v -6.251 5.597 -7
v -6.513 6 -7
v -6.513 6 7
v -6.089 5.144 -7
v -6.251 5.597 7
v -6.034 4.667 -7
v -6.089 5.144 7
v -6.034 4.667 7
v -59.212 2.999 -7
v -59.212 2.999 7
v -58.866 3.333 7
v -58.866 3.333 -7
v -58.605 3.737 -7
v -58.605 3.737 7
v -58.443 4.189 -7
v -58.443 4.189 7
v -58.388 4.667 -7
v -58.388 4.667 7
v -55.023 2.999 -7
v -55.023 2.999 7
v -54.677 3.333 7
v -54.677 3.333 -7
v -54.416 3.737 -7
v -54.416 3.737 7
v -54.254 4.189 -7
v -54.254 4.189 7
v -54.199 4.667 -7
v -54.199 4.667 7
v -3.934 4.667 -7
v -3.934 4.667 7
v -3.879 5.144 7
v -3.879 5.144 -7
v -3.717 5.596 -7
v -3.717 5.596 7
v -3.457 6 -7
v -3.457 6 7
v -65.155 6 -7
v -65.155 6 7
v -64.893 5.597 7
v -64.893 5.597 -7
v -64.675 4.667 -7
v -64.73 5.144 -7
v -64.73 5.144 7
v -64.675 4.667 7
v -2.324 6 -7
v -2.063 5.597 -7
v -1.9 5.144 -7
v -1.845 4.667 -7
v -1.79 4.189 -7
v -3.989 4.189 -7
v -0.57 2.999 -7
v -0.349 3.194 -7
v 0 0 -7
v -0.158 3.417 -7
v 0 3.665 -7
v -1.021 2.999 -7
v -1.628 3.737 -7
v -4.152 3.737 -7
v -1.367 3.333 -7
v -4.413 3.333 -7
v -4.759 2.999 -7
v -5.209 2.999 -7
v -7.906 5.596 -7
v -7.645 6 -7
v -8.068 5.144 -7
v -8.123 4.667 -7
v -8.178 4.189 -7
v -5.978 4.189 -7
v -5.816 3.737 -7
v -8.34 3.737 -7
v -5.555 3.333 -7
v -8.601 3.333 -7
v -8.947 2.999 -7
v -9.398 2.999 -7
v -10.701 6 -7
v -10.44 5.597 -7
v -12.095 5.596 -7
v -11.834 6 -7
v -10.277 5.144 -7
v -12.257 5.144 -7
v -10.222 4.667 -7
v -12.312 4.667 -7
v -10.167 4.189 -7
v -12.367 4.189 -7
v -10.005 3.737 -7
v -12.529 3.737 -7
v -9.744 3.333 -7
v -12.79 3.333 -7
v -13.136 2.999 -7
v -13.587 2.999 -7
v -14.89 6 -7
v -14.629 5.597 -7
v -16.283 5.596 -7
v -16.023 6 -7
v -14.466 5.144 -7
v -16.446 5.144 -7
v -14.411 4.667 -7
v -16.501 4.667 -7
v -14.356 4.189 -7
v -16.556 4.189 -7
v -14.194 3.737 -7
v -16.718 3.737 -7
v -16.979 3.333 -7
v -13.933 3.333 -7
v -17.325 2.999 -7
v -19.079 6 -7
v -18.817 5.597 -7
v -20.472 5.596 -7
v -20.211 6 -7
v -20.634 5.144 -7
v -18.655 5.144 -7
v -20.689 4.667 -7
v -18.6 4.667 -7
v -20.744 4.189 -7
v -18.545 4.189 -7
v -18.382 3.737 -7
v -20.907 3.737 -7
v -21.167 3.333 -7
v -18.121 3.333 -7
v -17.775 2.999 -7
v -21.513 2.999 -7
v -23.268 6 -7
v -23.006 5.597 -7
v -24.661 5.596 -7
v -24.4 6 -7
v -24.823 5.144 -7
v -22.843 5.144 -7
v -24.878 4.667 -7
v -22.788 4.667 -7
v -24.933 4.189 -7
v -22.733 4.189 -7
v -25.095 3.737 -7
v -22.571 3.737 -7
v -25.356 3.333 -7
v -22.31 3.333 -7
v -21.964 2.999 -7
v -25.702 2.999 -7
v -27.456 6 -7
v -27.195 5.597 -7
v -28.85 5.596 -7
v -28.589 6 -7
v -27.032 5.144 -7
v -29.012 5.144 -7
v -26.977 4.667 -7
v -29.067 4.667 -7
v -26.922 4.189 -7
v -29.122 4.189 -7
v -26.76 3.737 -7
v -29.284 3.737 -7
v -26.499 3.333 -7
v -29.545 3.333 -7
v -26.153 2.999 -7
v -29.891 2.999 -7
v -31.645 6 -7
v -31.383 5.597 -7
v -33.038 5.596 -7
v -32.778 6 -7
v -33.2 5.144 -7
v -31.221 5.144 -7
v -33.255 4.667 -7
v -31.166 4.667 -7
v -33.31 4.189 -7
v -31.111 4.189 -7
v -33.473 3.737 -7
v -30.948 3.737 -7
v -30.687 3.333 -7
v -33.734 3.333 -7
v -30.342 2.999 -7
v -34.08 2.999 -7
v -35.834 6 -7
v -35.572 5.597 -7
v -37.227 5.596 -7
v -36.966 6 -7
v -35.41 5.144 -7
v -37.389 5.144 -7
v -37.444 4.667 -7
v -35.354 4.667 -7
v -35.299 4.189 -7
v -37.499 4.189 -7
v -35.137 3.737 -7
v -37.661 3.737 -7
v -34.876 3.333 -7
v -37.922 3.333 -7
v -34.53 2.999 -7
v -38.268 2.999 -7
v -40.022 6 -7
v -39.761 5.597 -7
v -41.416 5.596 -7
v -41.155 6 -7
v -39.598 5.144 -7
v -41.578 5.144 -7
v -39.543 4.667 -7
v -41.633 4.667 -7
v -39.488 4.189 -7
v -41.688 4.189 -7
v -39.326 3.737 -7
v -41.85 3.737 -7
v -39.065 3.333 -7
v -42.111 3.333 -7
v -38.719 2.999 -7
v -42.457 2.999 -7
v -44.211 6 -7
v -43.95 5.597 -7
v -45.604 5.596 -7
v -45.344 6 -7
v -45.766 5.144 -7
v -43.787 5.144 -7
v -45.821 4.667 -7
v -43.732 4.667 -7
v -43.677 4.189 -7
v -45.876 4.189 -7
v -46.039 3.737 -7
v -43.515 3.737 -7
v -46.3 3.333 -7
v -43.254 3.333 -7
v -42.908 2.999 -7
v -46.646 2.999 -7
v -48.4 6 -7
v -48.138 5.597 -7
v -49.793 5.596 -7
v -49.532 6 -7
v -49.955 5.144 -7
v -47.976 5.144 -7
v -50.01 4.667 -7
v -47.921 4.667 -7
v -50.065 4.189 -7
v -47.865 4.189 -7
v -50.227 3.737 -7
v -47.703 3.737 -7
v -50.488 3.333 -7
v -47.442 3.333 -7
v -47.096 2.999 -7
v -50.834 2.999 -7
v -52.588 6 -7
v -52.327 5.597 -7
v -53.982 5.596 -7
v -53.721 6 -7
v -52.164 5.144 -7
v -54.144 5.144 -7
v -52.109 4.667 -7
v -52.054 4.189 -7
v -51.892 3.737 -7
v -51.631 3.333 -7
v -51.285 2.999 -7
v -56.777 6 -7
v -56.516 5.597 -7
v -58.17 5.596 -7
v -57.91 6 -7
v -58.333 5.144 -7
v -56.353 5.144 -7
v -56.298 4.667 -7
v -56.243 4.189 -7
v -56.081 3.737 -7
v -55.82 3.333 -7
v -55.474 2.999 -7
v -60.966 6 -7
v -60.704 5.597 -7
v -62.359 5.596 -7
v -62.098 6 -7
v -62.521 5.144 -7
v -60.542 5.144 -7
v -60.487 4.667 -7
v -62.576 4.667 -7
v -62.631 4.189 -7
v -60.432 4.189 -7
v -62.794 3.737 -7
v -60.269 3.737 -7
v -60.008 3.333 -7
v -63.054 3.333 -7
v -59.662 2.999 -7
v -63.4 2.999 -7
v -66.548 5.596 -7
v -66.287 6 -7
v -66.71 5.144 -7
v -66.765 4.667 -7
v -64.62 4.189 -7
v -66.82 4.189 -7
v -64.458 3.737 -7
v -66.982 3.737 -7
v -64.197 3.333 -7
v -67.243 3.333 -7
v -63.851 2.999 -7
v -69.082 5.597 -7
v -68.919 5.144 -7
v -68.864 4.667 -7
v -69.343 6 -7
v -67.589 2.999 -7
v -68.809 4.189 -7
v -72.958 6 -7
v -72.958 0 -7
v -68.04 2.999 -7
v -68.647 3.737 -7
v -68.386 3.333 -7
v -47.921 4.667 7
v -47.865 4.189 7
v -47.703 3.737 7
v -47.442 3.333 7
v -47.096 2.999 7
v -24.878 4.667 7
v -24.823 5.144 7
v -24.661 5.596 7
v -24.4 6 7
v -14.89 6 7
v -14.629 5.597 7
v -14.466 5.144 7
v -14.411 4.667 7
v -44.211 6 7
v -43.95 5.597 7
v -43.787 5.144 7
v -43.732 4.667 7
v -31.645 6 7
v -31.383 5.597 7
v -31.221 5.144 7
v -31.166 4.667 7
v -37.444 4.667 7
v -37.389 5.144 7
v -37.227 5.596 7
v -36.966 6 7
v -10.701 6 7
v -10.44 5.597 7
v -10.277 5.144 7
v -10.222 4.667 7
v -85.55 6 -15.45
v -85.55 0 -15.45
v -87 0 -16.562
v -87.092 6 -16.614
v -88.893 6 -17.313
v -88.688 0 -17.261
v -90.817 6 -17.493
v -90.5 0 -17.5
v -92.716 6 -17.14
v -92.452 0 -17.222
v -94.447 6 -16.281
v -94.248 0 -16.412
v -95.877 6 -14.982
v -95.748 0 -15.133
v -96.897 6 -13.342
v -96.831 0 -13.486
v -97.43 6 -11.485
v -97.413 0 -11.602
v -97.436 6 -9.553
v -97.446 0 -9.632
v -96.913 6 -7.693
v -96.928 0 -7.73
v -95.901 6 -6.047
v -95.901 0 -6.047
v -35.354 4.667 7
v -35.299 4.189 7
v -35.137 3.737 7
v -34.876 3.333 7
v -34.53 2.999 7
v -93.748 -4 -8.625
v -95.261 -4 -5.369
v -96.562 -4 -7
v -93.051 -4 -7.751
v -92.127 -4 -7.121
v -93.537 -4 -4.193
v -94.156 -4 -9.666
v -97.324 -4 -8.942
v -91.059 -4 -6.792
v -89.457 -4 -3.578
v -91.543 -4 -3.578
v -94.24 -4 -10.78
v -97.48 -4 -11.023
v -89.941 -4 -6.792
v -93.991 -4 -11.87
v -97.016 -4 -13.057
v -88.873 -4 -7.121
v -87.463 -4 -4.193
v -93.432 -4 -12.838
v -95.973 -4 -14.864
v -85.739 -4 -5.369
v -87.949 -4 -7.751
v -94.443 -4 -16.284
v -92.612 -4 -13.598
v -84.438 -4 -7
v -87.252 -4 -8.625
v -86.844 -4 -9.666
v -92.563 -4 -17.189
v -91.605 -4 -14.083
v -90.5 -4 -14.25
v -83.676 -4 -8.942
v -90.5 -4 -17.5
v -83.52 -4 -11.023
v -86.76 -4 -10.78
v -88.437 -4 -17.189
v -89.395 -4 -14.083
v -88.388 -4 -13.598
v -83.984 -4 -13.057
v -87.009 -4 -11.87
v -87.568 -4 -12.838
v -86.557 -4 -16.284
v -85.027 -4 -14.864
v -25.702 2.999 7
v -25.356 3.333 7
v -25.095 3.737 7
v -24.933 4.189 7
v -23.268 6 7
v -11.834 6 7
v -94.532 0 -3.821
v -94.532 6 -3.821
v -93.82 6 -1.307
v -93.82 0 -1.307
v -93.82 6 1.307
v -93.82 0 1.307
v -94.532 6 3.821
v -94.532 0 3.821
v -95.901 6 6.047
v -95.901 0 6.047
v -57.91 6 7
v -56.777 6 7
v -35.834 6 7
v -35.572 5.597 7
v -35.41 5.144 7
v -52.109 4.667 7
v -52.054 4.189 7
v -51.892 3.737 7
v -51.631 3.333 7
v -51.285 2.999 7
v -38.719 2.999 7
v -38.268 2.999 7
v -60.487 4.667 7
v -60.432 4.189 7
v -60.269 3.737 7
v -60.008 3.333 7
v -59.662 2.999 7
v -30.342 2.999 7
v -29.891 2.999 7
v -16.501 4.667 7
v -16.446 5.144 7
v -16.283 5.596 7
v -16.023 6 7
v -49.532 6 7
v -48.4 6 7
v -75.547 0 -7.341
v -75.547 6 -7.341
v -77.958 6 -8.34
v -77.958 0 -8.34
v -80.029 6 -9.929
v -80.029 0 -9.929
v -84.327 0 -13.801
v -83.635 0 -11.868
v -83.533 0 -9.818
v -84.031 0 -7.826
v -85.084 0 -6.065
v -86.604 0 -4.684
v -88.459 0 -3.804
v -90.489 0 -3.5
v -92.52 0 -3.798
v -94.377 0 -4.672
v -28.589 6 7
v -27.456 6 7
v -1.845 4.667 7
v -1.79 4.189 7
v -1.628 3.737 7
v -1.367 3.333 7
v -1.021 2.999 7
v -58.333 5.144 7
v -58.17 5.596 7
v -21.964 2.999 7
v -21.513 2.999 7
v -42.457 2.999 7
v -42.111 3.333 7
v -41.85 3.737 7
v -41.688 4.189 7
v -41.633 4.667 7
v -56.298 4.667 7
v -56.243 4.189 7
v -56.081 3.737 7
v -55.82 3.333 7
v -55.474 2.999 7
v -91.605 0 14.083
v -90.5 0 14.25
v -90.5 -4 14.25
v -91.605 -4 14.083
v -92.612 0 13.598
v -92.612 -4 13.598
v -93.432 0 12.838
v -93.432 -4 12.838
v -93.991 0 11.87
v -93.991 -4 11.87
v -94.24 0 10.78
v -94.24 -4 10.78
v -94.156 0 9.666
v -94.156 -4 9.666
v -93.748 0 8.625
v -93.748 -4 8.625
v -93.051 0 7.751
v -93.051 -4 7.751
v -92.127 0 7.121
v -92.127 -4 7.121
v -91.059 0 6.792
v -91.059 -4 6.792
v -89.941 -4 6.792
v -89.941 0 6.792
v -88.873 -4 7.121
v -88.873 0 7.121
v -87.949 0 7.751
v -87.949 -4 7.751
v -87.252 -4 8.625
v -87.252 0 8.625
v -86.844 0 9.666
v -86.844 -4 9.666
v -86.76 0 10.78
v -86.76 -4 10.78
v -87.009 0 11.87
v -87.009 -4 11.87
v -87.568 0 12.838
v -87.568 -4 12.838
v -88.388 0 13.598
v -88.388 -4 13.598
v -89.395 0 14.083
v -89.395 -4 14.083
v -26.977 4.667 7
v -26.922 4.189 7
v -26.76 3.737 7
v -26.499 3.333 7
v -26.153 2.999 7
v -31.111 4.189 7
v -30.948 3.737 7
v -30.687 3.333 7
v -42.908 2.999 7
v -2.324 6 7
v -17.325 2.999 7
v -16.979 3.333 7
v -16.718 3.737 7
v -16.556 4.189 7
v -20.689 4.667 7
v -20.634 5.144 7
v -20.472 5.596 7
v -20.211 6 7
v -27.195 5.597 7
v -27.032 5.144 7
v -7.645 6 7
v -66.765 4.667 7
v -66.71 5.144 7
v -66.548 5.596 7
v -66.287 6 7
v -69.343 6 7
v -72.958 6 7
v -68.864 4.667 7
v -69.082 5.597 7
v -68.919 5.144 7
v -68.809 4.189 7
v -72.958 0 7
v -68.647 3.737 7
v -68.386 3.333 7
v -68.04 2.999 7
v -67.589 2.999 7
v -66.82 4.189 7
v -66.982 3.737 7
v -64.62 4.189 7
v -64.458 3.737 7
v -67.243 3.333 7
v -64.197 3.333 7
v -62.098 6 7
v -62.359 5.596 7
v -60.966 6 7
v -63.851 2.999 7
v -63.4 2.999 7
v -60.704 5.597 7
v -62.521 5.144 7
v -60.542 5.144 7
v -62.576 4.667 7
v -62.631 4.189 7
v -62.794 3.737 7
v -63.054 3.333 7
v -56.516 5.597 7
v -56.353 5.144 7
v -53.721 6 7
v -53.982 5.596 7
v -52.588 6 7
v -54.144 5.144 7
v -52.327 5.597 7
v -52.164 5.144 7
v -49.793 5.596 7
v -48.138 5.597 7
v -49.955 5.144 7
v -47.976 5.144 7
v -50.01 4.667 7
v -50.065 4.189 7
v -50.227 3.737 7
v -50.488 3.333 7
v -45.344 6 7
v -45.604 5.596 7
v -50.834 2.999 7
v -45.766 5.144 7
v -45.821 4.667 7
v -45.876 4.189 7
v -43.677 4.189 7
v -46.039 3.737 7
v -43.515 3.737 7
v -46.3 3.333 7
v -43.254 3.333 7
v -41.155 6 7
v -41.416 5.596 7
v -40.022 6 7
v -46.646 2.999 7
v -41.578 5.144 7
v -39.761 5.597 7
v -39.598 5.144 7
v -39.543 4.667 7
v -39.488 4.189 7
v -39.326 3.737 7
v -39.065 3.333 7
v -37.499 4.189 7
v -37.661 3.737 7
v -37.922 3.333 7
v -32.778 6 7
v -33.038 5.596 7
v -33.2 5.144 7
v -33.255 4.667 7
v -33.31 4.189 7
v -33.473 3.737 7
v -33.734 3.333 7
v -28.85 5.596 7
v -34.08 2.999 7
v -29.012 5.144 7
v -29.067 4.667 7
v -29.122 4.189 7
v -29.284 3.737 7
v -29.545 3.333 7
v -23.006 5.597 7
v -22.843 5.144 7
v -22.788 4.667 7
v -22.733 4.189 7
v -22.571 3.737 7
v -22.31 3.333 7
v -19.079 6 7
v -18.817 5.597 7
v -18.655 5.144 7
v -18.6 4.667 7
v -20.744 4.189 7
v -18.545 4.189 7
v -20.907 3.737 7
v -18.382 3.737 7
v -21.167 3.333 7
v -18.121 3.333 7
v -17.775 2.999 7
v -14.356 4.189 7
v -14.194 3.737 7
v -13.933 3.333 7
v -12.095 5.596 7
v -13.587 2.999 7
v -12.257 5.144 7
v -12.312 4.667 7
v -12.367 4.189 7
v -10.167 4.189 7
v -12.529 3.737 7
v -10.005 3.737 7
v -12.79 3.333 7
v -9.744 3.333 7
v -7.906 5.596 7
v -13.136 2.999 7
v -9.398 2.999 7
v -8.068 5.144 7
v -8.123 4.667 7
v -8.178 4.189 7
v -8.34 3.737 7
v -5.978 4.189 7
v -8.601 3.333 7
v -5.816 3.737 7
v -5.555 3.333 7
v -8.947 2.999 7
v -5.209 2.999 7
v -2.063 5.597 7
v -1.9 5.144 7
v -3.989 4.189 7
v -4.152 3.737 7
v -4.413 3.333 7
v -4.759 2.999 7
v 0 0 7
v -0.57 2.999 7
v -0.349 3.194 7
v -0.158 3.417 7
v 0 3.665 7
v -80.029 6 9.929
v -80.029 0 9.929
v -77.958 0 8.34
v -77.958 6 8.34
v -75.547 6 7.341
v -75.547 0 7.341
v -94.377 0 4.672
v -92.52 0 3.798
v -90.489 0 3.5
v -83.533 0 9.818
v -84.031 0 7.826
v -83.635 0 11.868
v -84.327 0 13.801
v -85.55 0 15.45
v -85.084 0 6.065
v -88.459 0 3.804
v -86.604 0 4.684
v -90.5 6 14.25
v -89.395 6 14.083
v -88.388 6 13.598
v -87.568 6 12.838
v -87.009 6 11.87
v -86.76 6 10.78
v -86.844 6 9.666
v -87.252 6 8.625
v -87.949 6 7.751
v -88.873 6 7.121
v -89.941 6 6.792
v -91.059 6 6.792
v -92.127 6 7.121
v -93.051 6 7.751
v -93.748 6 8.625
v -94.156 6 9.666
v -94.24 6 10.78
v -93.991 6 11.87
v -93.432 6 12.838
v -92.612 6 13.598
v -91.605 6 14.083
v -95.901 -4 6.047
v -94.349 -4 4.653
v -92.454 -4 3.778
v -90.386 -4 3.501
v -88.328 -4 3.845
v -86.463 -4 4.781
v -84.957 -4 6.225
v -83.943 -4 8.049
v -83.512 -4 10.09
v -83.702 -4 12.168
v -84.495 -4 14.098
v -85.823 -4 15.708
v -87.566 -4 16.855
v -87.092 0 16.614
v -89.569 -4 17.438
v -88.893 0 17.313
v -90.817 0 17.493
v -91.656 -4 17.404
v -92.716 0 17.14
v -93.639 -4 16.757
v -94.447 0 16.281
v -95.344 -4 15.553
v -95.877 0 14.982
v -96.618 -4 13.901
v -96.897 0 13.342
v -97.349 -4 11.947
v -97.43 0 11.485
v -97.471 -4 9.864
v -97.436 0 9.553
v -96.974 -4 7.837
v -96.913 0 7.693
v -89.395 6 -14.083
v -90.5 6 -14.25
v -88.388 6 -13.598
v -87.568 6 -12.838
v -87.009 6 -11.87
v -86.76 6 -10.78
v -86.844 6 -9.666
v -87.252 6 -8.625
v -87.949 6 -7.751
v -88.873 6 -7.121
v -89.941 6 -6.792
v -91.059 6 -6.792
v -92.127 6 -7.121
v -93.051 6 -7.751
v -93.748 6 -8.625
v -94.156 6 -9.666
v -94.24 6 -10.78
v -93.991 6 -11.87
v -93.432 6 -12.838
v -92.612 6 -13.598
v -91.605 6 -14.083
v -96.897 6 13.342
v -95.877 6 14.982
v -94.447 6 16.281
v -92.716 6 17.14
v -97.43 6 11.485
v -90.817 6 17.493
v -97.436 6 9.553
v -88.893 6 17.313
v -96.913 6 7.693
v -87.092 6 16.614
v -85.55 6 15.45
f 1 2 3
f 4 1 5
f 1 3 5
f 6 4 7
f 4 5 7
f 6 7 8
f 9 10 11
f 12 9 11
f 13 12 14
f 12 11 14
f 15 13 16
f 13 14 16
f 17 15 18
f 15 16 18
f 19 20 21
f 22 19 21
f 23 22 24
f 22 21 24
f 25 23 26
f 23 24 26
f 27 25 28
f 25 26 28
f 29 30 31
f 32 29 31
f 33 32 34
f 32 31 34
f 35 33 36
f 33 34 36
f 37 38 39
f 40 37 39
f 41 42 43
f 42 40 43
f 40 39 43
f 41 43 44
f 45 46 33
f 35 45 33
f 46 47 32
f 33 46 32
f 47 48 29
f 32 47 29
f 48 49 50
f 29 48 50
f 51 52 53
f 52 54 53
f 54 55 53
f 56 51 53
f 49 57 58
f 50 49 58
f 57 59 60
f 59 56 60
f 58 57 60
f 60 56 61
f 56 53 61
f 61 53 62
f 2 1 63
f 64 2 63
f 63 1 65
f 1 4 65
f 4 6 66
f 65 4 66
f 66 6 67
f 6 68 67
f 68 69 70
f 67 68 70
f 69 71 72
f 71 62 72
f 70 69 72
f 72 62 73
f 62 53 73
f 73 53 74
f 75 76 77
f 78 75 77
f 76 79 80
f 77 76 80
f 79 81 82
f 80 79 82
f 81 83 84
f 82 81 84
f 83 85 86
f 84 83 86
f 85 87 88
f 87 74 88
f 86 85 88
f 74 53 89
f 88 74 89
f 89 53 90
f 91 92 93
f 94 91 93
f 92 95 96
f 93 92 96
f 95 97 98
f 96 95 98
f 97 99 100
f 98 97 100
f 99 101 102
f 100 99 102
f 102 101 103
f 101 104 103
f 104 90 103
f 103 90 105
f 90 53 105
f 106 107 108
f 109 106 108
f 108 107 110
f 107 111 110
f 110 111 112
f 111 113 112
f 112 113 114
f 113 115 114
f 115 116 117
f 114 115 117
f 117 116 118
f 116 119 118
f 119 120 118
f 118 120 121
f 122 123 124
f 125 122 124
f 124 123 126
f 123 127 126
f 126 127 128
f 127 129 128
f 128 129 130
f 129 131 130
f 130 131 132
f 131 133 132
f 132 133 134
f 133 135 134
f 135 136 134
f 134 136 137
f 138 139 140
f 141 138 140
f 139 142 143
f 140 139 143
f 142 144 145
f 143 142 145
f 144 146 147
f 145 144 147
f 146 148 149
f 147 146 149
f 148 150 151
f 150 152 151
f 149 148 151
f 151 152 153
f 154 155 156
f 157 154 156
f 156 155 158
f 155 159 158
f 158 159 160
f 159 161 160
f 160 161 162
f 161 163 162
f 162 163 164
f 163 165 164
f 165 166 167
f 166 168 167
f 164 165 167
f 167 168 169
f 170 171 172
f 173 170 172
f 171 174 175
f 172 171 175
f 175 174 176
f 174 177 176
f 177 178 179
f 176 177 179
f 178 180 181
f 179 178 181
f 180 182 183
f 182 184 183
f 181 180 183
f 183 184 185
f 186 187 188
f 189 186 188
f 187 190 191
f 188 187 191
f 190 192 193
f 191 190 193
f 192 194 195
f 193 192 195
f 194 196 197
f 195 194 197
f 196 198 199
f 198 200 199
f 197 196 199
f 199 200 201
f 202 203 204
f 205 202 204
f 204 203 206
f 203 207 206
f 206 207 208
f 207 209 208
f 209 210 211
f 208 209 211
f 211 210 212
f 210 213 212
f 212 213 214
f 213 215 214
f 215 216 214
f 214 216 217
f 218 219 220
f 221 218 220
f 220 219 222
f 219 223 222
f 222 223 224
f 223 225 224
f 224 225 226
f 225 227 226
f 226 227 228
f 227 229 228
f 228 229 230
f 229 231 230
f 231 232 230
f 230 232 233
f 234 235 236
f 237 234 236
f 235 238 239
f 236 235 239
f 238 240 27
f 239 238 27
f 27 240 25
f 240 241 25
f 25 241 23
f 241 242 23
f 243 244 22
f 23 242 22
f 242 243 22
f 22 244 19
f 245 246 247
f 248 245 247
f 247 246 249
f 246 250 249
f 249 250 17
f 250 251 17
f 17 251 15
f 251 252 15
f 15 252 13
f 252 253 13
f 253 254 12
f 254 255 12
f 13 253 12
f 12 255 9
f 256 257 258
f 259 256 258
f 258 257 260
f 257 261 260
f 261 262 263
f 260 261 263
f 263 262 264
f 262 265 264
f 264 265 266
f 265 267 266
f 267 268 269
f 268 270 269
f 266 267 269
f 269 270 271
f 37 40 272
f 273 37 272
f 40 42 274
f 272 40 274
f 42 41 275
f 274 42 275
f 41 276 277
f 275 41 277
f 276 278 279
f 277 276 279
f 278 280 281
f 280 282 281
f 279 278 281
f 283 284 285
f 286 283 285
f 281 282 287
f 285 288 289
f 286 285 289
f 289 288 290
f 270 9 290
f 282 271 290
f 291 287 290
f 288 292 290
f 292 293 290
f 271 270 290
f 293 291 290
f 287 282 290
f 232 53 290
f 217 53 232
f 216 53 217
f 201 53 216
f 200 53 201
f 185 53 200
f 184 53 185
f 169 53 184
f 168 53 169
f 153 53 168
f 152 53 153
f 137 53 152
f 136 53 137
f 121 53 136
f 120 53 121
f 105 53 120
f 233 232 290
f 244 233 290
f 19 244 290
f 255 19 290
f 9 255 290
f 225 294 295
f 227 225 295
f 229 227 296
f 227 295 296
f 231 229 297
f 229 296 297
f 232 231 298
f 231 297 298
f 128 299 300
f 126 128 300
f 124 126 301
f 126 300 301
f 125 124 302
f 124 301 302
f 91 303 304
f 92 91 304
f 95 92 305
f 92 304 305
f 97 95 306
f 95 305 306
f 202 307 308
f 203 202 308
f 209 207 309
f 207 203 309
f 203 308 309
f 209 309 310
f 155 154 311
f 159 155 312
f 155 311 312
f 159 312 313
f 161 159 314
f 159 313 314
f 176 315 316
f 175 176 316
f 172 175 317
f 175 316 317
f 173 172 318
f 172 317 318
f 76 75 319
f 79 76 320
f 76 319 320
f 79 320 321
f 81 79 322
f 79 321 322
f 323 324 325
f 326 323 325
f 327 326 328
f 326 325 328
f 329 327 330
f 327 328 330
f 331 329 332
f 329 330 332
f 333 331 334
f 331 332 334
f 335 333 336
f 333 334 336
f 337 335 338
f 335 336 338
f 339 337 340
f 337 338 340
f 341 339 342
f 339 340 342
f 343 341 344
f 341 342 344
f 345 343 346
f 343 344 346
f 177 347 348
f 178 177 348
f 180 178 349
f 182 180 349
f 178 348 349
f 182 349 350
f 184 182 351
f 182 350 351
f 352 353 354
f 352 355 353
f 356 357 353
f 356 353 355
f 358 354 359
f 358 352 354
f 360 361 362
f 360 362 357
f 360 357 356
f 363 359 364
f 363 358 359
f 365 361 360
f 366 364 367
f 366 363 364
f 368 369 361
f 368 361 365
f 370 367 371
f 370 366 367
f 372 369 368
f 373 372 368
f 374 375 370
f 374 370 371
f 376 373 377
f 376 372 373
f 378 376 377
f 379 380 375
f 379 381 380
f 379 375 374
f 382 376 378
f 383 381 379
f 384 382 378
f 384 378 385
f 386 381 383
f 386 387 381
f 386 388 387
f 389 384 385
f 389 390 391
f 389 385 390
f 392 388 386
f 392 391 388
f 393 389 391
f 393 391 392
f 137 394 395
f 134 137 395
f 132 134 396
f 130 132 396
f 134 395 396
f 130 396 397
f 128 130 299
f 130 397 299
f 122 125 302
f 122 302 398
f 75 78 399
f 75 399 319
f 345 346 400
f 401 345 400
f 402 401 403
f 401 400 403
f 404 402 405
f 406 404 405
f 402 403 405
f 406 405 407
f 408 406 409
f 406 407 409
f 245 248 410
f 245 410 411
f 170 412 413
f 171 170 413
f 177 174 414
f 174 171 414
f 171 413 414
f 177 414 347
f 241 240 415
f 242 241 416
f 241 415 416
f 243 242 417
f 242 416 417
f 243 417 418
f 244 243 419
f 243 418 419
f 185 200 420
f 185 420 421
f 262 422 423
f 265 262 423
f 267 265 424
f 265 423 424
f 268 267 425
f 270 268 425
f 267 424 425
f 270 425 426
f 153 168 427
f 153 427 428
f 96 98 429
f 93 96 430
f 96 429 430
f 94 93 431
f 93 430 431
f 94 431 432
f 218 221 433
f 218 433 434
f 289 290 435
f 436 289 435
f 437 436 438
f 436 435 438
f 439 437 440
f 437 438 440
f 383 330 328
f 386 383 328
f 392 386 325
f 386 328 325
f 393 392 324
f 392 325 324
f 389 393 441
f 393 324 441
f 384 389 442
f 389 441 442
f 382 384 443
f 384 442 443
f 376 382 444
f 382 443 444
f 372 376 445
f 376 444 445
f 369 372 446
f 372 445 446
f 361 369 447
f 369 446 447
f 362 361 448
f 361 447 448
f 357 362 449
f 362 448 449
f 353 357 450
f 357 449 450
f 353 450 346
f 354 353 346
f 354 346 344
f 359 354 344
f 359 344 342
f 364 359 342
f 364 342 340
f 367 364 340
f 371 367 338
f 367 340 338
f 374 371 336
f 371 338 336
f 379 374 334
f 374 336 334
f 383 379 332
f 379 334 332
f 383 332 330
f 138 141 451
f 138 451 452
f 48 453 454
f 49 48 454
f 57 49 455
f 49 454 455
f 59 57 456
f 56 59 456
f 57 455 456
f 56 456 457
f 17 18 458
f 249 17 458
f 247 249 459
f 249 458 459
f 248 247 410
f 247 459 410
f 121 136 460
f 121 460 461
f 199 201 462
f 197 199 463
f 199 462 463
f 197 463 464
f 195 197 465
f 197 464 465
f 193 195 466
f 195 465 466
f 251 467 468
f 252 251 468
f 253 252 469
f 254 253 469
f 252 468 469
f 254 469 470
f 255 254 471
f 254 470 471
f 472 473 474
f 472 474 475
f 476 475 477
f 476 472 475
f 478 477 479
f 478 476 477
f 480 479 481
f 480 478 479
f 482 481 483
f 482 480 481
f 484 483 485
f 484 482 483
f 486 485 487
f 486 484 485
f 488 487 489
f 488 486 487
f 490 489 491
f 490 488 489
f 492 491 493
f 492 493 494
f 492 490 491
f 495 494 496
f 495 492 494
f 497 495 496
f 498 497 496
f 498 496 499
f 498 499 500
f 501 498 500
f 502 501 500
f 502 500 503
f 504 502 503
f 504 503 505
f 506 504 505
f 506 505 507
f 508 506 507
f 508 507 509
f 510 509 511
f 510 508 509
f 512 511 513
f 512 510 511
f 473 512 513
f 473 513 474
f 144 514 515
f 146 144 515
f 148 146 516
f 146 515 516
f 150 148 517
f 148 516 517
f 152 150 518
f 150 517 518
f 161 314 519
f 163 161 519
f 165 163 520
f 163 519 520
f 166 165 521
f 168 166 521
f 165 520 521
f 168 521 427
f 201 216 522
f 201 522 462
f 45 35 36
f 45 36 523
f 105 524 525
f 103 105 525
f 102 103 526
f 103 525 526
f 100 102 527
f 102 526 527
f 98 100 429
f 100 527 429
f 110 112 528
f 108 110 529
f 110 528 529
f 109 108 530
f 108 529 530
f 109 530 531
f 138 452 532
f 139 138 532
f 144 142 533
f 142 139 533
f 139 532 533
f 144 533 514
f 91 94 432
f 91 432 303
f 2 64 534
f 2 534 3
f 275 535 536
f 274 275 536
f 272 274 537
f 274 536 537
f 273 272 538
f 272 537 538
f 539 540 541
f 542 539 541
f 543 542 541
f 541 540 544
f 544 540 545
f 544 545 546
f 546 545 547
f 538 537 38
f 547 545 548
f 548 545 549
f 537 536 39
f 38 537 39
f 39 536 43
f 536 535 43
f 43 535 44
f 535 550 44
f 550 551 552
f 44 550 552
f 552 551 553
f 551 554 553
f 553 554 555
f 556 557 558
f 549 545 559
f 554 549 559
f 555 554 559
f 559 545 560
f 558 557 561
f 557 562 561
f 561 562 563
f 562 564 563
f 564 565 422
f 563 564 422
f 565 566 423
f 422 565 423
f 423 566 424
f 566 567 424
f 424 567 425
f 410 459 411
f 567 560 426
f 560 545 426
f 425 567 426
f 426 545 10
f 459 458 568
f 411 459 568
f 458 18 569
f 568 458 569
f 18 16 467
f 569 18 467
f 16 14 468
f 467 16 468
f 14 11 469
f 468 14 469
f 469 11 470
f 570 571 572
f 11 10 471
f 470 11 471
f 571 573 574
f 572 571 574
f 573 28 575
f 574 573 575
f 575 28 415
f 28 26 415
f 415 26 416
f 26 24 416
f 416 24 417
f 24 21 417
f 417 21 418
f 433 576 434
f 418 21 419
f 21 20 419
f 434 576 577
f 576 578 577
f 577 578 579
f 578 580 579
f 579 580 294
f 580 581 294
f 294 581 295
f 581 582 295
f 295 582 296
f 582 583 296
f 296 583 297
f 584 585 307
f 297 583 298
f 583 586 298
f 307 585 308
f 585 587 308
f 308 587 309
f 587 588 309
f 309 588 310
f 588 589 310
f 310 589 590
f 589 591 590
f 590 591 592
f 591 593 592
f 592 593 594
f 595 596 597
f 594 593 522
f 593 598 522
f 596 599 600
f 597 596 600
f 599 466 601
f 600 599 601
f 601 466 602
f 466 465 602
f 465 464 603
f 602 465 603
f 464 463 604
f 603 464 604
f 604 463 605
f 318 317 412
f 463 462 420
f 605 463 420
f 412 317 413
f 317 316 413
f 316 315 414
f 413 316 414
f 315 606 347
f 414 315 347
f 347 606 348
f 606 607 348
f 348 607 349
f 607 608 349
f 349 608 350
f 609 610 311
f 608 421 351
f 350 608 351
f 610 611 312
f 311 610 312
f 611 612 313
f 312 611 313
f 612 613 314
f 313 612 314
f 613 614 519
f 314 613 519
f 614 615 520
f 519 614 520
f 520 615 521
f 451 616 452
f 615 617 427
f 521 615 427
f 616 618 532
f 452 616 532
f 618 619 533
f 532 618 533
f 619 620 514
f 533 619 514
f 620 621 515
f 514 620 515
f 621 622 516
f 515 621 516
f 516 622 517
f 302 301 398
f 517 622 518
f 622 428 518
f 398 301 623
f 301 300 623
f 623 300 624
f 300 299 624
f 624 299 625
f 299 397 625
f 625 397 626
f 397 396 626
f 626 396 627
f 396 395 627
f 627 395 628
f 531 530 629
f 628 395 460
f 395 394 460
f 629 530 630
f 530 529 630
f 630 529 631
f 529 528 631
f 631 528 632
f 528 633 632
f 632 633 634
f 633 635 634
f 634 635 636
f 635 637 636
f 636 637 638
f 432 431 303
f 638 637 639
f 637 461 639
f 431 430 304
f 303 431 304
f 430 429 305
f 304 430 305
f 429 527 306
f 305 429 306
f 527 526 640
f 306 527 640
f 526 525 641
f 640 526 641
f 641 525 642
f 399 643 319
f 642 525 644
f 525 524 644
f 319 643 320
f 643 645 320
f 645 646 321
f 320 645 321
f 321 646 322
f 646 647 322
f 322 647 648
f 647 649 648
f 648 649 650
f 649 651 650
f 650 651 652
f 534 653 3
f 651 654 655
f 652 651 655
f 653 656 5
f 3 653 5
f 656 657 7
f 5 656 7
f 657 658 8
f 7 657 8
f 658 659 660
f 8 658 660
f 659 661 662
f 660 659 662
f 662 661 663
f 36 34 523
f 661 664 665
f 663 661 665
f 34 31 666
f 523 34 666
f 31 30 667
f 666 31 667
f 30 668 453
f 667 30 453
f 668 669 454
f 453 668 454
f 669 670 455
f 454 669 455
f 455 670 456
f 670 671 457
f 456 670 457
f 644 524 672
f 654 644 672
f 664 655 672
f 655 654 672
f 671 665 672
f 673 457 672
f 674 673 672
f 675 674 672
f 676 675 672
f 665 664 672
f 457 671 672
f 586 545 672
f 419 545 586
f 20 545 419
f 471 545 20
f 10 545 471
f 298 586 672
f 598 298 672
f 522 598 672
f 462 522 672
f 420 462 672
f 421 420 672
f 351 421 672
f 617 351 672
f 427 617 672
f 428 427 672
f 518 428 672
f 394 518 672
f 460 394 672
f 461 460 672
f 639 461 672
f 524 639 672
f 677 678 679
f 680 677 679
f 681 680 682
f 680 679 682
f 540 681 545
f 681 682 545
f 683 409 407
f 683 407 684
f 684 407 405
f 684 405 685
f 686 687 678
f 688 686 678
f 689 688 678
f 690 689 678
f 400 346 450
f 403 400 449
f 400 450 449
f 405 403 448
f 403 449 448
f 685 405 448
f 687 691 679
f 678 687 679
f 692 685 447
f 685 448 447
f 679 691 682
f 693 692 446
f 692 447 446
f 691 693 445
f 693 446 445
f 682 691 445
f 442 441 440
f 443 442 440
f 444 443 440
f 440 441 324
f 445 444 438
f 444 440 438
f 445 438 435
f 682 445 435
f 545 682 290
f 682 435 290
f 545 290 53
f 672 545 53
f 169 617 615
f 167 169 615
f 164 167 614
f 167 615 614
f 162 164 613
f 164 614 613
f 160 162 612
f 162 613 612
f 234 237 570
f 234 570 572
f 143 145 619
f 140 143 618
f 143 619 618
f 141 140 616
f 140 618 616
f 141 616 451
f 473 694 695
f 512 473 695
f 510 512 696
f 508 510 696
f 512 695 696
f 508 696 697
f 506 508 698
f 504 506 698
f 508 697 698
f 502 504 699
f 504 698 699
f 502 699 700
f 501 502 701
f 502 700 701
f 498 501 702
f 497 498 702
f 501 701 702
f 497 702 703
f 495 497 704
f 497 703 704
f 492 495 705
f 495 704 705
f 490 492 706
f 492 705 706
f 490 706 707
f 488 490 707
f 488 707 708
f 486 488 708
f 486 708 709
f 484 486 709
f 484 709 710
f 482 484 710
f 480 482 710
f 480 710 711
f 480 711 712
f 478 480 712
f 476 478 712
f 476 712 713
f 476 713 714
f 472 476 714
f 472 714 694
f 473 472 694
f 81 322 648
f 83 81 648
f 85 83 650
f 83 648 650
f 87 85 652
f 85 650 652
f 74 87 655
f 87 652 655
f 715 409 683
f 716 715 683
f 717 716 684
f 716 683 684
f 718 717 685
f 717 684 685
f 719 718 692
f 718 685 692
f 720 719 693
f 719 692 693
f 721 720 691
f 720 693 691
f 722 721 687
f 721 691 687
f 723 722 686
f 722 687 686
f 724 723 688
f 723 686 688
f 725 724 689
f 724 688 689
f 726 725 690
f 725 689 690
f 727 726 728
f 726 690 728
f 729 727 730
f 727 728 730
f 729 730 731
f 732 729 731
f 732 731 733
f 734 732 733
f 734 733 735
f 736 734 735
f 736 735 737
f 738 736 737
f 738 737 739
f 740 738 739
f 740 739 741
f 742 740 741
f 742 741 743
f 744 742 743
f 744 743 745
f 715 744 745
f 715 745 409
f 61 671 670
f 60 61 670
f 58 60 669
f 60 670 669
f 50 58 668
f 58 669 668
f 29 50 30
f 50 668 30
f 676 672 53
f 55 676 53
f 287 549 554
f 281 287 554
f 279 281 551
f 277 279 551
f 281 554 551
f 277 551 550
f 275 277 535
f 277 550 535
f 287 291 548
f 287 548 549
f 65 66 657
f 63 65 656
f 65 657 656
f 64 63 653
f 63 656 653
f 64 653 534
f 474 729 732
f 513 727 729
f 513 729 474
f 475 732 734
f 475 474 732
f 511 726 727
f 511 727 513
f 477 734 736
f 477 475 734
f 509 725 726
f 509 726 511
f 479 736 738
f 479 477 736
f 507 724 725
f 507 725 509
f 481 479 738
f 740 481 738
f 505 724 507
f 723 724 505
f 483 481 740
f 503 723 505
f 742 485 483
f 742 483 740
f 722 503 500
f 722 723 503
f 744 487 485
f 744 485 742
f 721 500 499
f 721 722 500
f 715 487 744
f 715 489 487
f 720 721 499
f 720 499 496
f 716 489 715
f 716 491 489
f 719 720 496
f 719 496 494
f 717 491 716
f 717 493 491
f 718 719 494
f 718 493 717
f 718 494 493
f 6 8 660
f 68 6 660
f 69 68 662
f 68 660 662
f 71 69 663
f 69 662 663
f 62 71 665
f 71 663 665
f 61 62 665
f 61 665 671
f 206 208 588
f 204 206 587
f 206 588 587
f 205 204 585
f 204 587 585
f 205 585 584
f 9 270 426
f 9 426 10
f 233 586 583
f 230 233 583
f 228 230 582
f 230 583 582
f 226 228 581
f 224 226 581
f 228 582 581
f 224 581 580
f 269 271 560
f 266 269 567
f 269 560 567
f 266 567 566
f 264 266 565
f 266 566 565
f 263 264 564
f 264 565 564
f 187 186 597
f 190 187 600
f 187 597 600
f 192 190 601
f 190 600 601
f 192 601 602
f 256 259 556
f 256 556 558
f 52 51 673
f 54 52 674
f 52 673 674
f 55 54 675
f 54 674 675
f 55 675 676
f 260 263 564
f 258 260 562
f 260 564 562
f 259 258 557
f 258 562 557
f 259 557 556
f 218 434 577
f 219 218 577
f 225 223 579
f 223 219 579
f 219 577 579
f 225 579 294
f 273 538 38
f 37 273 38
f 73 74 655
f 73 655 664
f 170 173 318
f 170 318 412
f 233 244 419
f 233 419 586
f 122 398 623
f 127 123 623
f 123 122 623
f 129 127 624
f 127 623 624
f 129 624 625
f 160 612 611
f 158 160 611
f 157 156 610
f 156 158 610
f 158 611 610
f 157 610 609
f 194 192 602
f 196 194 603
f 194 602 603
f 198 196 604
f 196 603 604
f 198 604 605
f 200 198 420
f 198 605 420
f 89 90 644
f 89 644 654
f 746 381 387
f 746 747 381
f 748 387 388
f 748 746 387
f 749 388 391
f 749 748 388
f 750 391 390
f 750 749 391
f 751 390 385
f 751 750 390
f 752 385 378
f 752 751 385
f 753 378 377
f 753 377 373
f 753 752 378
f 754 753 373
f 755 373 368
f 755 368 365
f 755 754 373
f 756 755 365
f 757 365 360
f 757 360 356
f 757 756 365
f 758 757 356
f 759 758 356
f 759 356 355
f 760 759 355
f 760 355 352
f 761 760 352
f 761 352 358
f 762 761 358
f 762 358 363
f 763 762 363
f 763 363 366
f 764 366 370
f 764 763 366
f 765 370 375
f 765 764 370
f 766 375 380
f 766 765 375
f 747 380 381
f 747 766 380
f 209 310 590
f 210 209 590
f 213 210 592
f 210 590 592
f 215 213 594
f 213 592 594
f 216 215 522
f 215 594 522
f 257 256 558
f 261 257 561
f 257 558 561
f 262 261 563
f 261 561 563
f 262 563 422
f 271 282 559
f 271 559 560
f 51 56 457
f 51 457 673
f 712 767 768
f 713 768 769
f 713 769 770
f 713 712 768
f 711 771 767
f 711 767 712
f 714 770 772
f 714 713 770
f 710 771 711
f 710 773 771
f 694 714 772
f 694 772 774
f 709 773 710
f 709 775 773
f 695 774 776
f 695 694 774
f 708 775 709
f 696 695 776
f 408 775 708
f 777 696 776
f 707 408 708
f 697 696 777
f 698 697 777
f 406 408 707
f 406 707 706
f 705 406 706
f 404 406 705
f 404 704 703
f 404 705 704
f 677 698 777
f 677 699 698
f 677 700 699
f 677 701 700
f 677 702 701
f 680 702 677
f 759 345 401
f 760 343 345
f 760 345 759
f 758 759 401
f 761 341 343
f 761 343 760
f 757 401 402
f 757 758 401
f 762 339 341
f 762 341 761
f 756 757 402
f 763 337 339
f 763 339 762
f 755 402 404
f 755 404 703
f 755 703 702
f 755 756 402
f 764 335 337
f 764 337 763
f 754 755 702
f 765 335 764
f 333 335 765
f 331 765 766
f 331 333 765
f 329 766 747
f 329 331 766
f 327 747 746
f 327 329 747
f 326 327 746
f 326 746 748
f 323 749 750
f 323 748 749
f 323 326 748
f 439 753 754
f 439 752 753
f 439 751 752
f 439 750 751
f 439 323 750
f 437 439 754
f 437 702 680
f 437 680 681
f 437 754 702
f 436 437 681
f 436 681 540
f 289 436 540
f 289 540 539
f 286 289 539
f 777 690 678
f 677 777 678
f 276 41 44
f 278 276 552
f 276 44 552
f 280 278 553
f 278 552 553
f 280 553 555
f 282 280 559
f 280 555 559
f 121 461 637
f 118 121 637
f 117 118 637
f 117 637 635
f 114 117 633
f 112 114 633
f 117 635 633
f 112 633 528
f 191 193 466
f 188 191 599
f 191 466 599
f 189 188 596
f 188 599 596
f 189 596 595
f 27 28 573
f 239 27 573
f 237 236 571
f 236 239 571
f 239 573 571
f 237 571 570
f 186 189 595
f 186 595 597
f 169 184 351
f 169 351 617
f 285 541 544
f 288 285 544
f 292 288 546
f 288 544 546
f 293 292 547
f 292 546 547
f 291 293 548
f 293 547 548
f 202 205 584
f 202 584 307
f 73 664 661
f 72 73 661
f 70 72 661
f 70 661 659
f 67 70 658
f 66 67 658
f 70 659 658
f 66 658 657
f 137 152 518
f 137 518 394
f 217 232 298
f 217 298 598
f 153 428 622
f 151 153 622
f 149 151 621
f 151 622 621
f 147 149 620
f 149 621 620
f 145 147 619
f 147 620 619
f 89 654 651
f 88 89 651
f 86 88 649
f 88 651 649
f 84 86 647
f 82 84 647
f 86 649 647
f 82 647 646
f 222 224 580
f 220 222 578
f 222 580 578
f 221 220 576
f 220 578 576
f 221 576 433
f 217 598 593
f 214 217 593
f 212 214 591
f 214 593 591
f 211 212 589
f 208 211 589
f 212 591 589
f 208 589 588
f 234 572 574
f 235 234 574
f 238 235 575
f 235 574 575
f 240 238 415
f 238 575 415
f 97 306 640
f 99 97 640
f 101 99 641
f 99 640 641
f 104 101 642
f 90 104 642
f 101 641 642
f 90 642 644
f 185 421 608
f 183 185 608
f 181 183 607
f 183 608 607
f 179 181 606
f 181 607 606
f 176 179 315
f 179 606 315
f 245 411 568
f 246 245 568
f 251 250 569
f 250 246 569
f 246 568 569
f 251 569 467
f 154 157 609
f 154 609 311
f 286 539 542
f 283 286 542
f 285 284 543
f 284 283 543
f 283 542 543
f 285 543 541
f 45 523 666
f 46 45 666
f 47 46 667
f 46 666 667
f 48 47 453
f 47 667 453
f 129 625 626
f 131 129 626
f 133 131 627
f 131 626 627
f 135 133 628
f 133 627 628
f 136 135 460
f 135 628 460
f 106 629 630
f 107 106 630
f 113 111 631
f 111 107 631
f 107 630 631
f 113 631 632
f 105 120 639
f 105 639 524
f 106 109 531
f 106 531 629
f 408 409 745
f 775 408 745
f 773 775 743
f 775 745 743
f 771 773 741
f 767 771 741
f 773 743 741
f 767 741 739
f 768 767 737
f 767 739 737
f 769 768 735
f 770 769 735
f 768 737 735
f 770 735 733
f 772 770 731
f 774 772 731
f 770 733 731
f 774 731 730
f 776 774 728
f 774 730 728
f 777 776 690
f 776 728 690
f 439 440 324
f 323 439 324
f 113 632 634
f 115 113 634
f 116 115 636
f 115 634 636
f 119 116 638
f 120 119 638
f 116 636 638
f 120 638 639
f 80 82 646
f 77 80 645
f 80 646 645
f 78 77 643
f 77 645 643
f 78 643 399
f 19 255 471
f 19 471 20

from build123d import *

# Parameters (mm, degrees)
SALIENTE_EXTRUIR1_DEPTH = 6
CROQUIS18_R             = 3.75
CORTAR_EXTRUIR2_DEPTH   = 100.239609028
CORTAR_EXTRUIR3_DEPTH   = 101.709979645
CROQUIS21_R             = 7
CROQUIS21_R_2           = 3.75
SALIENTE_EXTRUIR3_DEPTH = 4


with BuildPart() as part:
    # Croquis14 → Saliente-Extruir1 (new body)
    with BuildSketch(Plane(origin=(0, 0, 0), x_dir=(1, 0, 0), z_dir=(0, 1, 0))):
        with BuildLine():
            Line((0, 7), (-72.95836944, 7))
            ThreePointArc((-72.95836944, 7), (-76.785203763, 7.761204675), (-80.029437252, 9.928932188))
            Line((-80.029437252, 9.928932188), (-85.550252532, 15.449747468))
            ThreePointArc((-85.550252532, 15.449747468), (-95.206682203, 15.681422839), (-95.901175207, 6.047213638))
            ThreePointArc((-95.901175207, 6.047213638), (-93.729852734, 0), (-95.901175207, -6.047213638))
            ThreePointArc((-95.901175207, -6.047213638), (-95.206682203, -15.681422839), (-85.550252532, -15.449747468))
            Line((-85.550252532, -15.449747468), (-80.029437252, -9.928932188))
            ThreePointArc((-80.029437252, -9.928932188), (-76.785203763, -7.761204675), (-72.95836944, -7))
            Line((-72.95836944, -7), (0, -7))
            Line((0, -7), (0, 7))
        make_face()
    extrude(amount=SALIENTE_EXTRUIR1_DEPTH)

    # Croquis18 → Cortar-Extruir2 (cut, through all)
    with BuildSketch(Plane(origin=(0, 6, 0), x_dir=(1, 0, 0), z_dir=(0, 1, 0))):
        with Locations(Location((-90.5, -10.5, 0), (0, 0, 270))):
            Circle(CROQUIS18_R)
        with Locations(Location((-90.5, 10.5, 0), (0, 0, 90))):
            Circle(CROQUIS18_R)
    extrude(amount=-CORTAR_EXTRUIR2_DEPTH, mode=Mode.SUBTRACT)

    # Croquis16 → Cortar-Extruir3 (cut, through all)
    with BuildSketch(Plane.XY.offset(7)):
        with BuildLine():
            Line((-63.851106218, 2.999108248), (-63.400446165, 2.999108248))
            ThreePointArc((-63.400446165, 2.999108248), (-62.793533932, 3.736620744), (-62.576232944, 4.6667))
            ThreePointArc((-62.576232944, 4.6667), (-62.453168135, 5.374868347), (-62.098403746, 6))
            Line((-62.098403746, 6), (-65.15454931, 6))
            ThreePointArc((-65.15454931, 6), (-64.798764982, 5.375104926), (-64.67531944, 4.6667))
            ThreePointArc((-64.67531944, 4.6667), (-64.458018451, 3.736620744), (-63.851106218, 2.999108248))
        make_face()
        with BuildLine():
            Line((-59.662406218, 2.999108248), (-59.211746165, 2.999108248))
            ThreePointArc((-59.211746165, 2.999108248), (-58.604833932, 3.736620744), (-58.387532944, 4.6667))
            ThreePointArc((-58.387532944, 4.6667), (-58.264468135, 5.374868347), (-57.909703746, 6))
            Line((-57.909703746, 6), (-60.96584931, 6))
            ThreePointArc((-60.96584931, 6), (-60.610064982, 5.375104926), (-60.48661944, 4.6667))
            ThreePointArc((-60.48661944, 4.6667), (-60.269318451, 3.736620744), (-59.662406218, 2.999108248))
        make_face()
        with BuildLine():
            Line((-68.039806218, 2.999108248), (-67.589146165, 2.999108248))
            ThreePointArc((-67.589146165, 2.999108248), (-66.982233932, 3.736620744), (-66.764932944, 4.6667))
            ThreePointArc((-66.764932944, 4.6667), (-66.641868135, 5.374868347), (-66.287103746, 6))
            Line((-66.287103746, 6), (-69.34324931, 6))
            ThreePointArc((-69.34324931, 6), (-68.987464982, 5.375104926), (-68.86401944, 4.6667))
            ThreePointArc((-68.86401944, 4.6667), (-68.646718451, 3.736620744), (-68.039806218, 2.999108248))
        make_face()
        with BuildLine():
            Line((-55.473706218, 2.999108248), (-55.023046165, 2.999108248))
            ThreePointArc((-55.023046165, 2.999108248), (-54.416133932, 3.736620744), (-54.198832944, 4.6667))
            ThreePointArc((-54.198832944, 4.6667), (-54.075768135, 5.374868347), (-53.721003746, 6))
            Line((-53.721003746, 6), (-56.77714931, 6))
            ThreePointArc((-56.77714931, 6), (-56.421364982, 5.375104926), (-56.29791944, 4.6667))
            ThreePointArc((-56.29791944, 4.6667), (-56.080618451, 3.736620744), (-55.473706218, 2.999108248))
        make_face()
        with BuildLine():
            Line((-51.285006218, 2.999108248), (-50.834346165, 2.999108248))
            ThreePointArc((-50.834346165, 2.999108248), (-50.227433932, 3.736620744), (-50.010132944, 4.6667))
            ThreePointArc((-50.010132944, 4.6667), (-49.887068135, 5.374868347), (-49.532303746, 6))
            Line((-49.532303746, 6), (-52.58844931, 6))
            ThreePointArc((-52.58844931, 6), (-52.232664982, 5.375104926), (-52.10921944, 4.6667))
            ThreePointArc((-52.10921944, 4.6667), (-51.891918451, 3.736620744), (-51.285006218, 2.999108248))
        make_face()
        with BuildLine():
            Line((-47.096306218, 2.999108248), (-46.645646165, 2.999108248))
            ThreePointArc((-46.645646165, 2.999108248), (-46.038733932, 3.736620744), (-45.821432944, 4.6667))
            ThreePointArc((-45.821432944, 4.6667), (-45.698368135, 5.374868347), (-45.343603746, 6))
            Line((-45.343603746, 6), (-48.39974931, 6))
            ThreePointArc((-48.39974931, 6), (-48.043964982, 5.375104926), (-47.92051944, 4.6667))
            ThreePointArc((-47.92051944, 4.6667), (-47.703218451, 3.736620744), (-47.096306218, 2.999108248))
        make_face()
        with BuildLine():
            Line((-42.907606218, 2.999108248), (-42.456946165, 2.999108248))
            ThreePointArc((-42.456946165, 2.999108248), (-41.850033932, 3.736620744), (-41.632732944, 4.6667))
            ThreePointArc((-41.632732944, 4.6667), (-41.509668135, 5.374868347), (-41.154903746, 6))
            Line((-41.154903746, 6), (-44.21104931, 6))
            ThreePointArc((-44.21104931, 6), (-43.855264982, 5.375104926), (-43.73181944, 4.6667))
            ThreePointArc((-43.73181944, 4.6667), (-43.514518451, 3.736620744), (-42.907606218, 2.999108248))
        make_face()
        with BuildLine():
            Line((-38.718906218, 2.999108248), (-38.268246165, 2.999108248))
            ThreePointArc((-38.268246165, 2.999108248), (-37.661333932, 3.736620744), (-37.444032944, 4.6667))
            ThreePointArc((-37.444032944, 4.6667), (-37.320968135, 5.374868347), (-36.966203746, 6))
            Line((-36.966203746, 6), (-40.02234931, 6))
            ThreePointArc((-40.02234931, 6), (-39.666564982, 5.375104926), (-39.54311944, 4.6667))
            ThreePointArc((-39.54311944, 4.6667), (-39.325818451, 3.736620744), (-38.718906218, 2.999108248))
        make_face()
        with BuildLine():
            Line((-34.530206218, 2.999108248), (-34.079546165, 2.999108248))
            ThreePointArc((-34.079546165, 2.999108248), (-33.472633932, 3.736620744), (-33.255332944, 4.6667))
            ThreePointArc((-33.255332944, 4.6667), (-33.132268135, 5.374868347), (-32.777503746, 6))
            Line((-32.777503746, 6), (-35.83364931, 6))
            ThreePointArc((-35.83364931, 6), (-35.477864982, 5.375104926), (-35.35441944, 4.6667))
            ThreePointArc((-35.35441944, 4.6667), (-35.137118451, 3.736620744), (-34.530206218, 2.999108248))
        make_face()
        with BuildLine():
            Line((-30.341506218, 2.999108248), (-29.890846165, 2.999108248))
            ThreePointArc((-29.890846165, 2.999108248), (-29.283933932, 3.736620744), (-29.066632944, 4.6667))
            ThreePointArc((-29.066632944, 4.6667), (-28.943568135, 5.374868347), (-28.588803746, 6))
            Line((-28.588803746, 6), (-31.64494931, 6))
            ThreePointArc((-31.64494931, 6), (-31.289164982, 5.375104926), (-31.16571944, 4.6667))
            ThreePointArc((-31.16571944, 4.6667), (-30.948418451, 3.736620744), (-30.341506218, 2.999108248))
        make_face()
        with BuildLine():
            Line((-26.152806218, 2.999108248), (-25.702146165, 2.999108248))
            ThreePointArc((-25.702146165, 2.999108248), (-25.095233932, 3.736620744), (-24.877932944, 4.6667))
            ThreePointArc((-24.877932944, 4.6667), (-24.754868135, 5.374868347), (-24.400103746, 6))
            Line((-24.400103746, 6), (-27.45624931, 6))
            ThreePointArc((-27.45624931, 6), (-27.100464982, 5.375104926), (-26.97701944, 4.6667))
            ThreePointArc((-26.97701944, 4.6667), (-26.759718451, 3.736620744), (-26.152806218, 2.999108248))
        make_face()
        with BuildLine():
            Line((-21.964106218, 2.999108248), (-21.513446165, 2.999108248))
            ThreePointArc((-21.513446165, 2.999108248), (-20.906533932, 3.736620744), (-20.689232944, 4.6667))
            ThreePointArc((-20.689232944, 4.6667), (-20.566168135, 5.374868347), (-20.211403746, 6))
            Line((-20.211403746, 6), (-23.26754931, 6))
            ThreePointArc((-23.26754931, 6), (-22.911764982, 5.375104926), (-22.78831944, 4.6667))
            ThreePointArc((-22.78831944, 4.6667), (-22.571018451, 3.736620744), (-21.964106218, 2.999108248))
        make_face()
        with BuildLine():
            Line((-17.775406218, 2.999108248), (-17.324746165, 2.999108248))
            ThreePointArc((-17.324746165, 2.999108248), (-16.717833932, 3.736620744), (-16.500532944, 4.6667))
            ThreePointArc((-16.500532944, 4.6667), (-16.377468135, 5.374868347), (-16.022703746, 6))
            Line((-16.022703746, 6), (-19.07884931, 6))
            ThreePointArc((-19.07884931, 6), (-18.723064982, 5.375104926), (-18.59961944, 4.6667))
            ThreePointArc((-18.59961944, 4.6667), (-18.382318451, 3.736620744), (-17.775406218, 2.999108248))
        make_face()
        with BuildLine():
            Line((-13.586706218, 2.999108248), (-13.136046165, 2.999108248))
            ThreePointArc((-13.136046165, 2.999108248), (-12.529133932, 3.736620744), (-12.311832944, 4.6667))
            ThreePointArc((-12.311832944, 4.6667), (-12.188768135, 5.374868347), (-11.834003746, 6))
            Line((-11.834003746, 6), (-14.89014931, 6))
            ThreePointArc((-14.89014931, 6), (-14.534364982, 5.375104926), (-14.41091944, 4.6667))
            ThreePointArc((-14.41091944, 4.6667), (-14.193618451, 3.736620744), (-13.586706218, 2.999108248))
        make_face()
        with BuildLine():
            Line((-9.398006218, 2.999108248), (-8.947346165, 2.999108248))
            ThreePointArc((-8.947346165, 2.999108248), (-8.340433932, 3.736620744), (-8.123132944, 4.6667))
            ThreePointArc((-8.123132944, 4.6667), (-8.000068135, 5.374868347), (-7.645303746, 6))
            Line((-7.645303746, 6), (-10.70144931, 6))
            ThreePointArc((-10.70144931, 6), (-10.345664982, 5.375104926), (-10.22221944, 4.6667))
            ThreePointArc((-10.22221944, 4.6667), (-10.004918451, 3.736620744), (-9.398006218, 2.999108248))
        make_face()
        with BuildLine():
            Line((-5.209306218, 2.999108248), (-4.758646165, 2.999108248))
            ThreePointArc((-4.758646165, 2.999108248), (-4.151733932, 3.736620744), (-3.934432944, 4.6667))
            ThreePointArc((-3.934432944, 4.6667), (-3.811368135, 5.374868347), (-3.456603746, 6))
            Line((-3.456603746, 6), (-6.51274931, 6))
            ThreePointArc((-6.51274931, 6), (-6.156964982, 5.375104926), (-6.03351944, 4.6667))
            ThreePointArc((-6.03351944, 4.6667), (-5.816218451, 3.736620744), (-5.209306218, 2.999108248))
        make_face()
        with BuildLine():
            Line((-1.020606218, 2.999108248), (-0.569946165, 2.999108248))
            ThreePointArc((-0.569946165, 2.999108248), (0.036966068, 3.736620744), (0.254267056, 4.6667))
            ThreePointArc((0.254267056, 4.6667), (0.377331865, 5.374868347), (0.732096254, 6))
            Line((0.732096254, 6), (-2.32404931, 6))
            ThreePointArc((-2.32404931, 6), (-1.968264982, 5.375104926), (-1.84481944, 4.6667))
            ThreePointArc((-1.84481944, 4.6667), (-1.627518451, 3.736620744), (-1.020606218, 2.999108248))
        make_face()
    extrude(amount=-CORTAR_EXTRUIR3_DEPTH, mode=Mode.SUBTRACT)

    # Croquis21 → Saliente-Extruir3 (add)
    # profile 1 of 2: a face of its own
    with BuildSketch(Plane.XZ):
        with Locations(Location((-90.5, -10.5, 0), (0, 0, 270))):
            Circle(CROQUIS21_R)
        with Locations(Location((-90.5, -10.5, 0), (0, 0, 270))):
            Circle(CROQUIS21_R_2, mode=Mode.SUBTRACT)
    # profile 2 of 2: a face of its own
    with BuildSketch(Plane.XZ):
        with Locations(Location((-90.5, 10.5, 0), (0, 0, 219.502533363))):
            Circle(CROQUIS21_R)
        with Locations(Location((-90.5, 10.5, 0), (0, 0, 90))):
            Circle(CROQUIS21_R_2, mode=Mode.SUBTRACT)
    extrude(amount=SALIENTE_EXTRUIR3_DEPTH)


solid = part.part
